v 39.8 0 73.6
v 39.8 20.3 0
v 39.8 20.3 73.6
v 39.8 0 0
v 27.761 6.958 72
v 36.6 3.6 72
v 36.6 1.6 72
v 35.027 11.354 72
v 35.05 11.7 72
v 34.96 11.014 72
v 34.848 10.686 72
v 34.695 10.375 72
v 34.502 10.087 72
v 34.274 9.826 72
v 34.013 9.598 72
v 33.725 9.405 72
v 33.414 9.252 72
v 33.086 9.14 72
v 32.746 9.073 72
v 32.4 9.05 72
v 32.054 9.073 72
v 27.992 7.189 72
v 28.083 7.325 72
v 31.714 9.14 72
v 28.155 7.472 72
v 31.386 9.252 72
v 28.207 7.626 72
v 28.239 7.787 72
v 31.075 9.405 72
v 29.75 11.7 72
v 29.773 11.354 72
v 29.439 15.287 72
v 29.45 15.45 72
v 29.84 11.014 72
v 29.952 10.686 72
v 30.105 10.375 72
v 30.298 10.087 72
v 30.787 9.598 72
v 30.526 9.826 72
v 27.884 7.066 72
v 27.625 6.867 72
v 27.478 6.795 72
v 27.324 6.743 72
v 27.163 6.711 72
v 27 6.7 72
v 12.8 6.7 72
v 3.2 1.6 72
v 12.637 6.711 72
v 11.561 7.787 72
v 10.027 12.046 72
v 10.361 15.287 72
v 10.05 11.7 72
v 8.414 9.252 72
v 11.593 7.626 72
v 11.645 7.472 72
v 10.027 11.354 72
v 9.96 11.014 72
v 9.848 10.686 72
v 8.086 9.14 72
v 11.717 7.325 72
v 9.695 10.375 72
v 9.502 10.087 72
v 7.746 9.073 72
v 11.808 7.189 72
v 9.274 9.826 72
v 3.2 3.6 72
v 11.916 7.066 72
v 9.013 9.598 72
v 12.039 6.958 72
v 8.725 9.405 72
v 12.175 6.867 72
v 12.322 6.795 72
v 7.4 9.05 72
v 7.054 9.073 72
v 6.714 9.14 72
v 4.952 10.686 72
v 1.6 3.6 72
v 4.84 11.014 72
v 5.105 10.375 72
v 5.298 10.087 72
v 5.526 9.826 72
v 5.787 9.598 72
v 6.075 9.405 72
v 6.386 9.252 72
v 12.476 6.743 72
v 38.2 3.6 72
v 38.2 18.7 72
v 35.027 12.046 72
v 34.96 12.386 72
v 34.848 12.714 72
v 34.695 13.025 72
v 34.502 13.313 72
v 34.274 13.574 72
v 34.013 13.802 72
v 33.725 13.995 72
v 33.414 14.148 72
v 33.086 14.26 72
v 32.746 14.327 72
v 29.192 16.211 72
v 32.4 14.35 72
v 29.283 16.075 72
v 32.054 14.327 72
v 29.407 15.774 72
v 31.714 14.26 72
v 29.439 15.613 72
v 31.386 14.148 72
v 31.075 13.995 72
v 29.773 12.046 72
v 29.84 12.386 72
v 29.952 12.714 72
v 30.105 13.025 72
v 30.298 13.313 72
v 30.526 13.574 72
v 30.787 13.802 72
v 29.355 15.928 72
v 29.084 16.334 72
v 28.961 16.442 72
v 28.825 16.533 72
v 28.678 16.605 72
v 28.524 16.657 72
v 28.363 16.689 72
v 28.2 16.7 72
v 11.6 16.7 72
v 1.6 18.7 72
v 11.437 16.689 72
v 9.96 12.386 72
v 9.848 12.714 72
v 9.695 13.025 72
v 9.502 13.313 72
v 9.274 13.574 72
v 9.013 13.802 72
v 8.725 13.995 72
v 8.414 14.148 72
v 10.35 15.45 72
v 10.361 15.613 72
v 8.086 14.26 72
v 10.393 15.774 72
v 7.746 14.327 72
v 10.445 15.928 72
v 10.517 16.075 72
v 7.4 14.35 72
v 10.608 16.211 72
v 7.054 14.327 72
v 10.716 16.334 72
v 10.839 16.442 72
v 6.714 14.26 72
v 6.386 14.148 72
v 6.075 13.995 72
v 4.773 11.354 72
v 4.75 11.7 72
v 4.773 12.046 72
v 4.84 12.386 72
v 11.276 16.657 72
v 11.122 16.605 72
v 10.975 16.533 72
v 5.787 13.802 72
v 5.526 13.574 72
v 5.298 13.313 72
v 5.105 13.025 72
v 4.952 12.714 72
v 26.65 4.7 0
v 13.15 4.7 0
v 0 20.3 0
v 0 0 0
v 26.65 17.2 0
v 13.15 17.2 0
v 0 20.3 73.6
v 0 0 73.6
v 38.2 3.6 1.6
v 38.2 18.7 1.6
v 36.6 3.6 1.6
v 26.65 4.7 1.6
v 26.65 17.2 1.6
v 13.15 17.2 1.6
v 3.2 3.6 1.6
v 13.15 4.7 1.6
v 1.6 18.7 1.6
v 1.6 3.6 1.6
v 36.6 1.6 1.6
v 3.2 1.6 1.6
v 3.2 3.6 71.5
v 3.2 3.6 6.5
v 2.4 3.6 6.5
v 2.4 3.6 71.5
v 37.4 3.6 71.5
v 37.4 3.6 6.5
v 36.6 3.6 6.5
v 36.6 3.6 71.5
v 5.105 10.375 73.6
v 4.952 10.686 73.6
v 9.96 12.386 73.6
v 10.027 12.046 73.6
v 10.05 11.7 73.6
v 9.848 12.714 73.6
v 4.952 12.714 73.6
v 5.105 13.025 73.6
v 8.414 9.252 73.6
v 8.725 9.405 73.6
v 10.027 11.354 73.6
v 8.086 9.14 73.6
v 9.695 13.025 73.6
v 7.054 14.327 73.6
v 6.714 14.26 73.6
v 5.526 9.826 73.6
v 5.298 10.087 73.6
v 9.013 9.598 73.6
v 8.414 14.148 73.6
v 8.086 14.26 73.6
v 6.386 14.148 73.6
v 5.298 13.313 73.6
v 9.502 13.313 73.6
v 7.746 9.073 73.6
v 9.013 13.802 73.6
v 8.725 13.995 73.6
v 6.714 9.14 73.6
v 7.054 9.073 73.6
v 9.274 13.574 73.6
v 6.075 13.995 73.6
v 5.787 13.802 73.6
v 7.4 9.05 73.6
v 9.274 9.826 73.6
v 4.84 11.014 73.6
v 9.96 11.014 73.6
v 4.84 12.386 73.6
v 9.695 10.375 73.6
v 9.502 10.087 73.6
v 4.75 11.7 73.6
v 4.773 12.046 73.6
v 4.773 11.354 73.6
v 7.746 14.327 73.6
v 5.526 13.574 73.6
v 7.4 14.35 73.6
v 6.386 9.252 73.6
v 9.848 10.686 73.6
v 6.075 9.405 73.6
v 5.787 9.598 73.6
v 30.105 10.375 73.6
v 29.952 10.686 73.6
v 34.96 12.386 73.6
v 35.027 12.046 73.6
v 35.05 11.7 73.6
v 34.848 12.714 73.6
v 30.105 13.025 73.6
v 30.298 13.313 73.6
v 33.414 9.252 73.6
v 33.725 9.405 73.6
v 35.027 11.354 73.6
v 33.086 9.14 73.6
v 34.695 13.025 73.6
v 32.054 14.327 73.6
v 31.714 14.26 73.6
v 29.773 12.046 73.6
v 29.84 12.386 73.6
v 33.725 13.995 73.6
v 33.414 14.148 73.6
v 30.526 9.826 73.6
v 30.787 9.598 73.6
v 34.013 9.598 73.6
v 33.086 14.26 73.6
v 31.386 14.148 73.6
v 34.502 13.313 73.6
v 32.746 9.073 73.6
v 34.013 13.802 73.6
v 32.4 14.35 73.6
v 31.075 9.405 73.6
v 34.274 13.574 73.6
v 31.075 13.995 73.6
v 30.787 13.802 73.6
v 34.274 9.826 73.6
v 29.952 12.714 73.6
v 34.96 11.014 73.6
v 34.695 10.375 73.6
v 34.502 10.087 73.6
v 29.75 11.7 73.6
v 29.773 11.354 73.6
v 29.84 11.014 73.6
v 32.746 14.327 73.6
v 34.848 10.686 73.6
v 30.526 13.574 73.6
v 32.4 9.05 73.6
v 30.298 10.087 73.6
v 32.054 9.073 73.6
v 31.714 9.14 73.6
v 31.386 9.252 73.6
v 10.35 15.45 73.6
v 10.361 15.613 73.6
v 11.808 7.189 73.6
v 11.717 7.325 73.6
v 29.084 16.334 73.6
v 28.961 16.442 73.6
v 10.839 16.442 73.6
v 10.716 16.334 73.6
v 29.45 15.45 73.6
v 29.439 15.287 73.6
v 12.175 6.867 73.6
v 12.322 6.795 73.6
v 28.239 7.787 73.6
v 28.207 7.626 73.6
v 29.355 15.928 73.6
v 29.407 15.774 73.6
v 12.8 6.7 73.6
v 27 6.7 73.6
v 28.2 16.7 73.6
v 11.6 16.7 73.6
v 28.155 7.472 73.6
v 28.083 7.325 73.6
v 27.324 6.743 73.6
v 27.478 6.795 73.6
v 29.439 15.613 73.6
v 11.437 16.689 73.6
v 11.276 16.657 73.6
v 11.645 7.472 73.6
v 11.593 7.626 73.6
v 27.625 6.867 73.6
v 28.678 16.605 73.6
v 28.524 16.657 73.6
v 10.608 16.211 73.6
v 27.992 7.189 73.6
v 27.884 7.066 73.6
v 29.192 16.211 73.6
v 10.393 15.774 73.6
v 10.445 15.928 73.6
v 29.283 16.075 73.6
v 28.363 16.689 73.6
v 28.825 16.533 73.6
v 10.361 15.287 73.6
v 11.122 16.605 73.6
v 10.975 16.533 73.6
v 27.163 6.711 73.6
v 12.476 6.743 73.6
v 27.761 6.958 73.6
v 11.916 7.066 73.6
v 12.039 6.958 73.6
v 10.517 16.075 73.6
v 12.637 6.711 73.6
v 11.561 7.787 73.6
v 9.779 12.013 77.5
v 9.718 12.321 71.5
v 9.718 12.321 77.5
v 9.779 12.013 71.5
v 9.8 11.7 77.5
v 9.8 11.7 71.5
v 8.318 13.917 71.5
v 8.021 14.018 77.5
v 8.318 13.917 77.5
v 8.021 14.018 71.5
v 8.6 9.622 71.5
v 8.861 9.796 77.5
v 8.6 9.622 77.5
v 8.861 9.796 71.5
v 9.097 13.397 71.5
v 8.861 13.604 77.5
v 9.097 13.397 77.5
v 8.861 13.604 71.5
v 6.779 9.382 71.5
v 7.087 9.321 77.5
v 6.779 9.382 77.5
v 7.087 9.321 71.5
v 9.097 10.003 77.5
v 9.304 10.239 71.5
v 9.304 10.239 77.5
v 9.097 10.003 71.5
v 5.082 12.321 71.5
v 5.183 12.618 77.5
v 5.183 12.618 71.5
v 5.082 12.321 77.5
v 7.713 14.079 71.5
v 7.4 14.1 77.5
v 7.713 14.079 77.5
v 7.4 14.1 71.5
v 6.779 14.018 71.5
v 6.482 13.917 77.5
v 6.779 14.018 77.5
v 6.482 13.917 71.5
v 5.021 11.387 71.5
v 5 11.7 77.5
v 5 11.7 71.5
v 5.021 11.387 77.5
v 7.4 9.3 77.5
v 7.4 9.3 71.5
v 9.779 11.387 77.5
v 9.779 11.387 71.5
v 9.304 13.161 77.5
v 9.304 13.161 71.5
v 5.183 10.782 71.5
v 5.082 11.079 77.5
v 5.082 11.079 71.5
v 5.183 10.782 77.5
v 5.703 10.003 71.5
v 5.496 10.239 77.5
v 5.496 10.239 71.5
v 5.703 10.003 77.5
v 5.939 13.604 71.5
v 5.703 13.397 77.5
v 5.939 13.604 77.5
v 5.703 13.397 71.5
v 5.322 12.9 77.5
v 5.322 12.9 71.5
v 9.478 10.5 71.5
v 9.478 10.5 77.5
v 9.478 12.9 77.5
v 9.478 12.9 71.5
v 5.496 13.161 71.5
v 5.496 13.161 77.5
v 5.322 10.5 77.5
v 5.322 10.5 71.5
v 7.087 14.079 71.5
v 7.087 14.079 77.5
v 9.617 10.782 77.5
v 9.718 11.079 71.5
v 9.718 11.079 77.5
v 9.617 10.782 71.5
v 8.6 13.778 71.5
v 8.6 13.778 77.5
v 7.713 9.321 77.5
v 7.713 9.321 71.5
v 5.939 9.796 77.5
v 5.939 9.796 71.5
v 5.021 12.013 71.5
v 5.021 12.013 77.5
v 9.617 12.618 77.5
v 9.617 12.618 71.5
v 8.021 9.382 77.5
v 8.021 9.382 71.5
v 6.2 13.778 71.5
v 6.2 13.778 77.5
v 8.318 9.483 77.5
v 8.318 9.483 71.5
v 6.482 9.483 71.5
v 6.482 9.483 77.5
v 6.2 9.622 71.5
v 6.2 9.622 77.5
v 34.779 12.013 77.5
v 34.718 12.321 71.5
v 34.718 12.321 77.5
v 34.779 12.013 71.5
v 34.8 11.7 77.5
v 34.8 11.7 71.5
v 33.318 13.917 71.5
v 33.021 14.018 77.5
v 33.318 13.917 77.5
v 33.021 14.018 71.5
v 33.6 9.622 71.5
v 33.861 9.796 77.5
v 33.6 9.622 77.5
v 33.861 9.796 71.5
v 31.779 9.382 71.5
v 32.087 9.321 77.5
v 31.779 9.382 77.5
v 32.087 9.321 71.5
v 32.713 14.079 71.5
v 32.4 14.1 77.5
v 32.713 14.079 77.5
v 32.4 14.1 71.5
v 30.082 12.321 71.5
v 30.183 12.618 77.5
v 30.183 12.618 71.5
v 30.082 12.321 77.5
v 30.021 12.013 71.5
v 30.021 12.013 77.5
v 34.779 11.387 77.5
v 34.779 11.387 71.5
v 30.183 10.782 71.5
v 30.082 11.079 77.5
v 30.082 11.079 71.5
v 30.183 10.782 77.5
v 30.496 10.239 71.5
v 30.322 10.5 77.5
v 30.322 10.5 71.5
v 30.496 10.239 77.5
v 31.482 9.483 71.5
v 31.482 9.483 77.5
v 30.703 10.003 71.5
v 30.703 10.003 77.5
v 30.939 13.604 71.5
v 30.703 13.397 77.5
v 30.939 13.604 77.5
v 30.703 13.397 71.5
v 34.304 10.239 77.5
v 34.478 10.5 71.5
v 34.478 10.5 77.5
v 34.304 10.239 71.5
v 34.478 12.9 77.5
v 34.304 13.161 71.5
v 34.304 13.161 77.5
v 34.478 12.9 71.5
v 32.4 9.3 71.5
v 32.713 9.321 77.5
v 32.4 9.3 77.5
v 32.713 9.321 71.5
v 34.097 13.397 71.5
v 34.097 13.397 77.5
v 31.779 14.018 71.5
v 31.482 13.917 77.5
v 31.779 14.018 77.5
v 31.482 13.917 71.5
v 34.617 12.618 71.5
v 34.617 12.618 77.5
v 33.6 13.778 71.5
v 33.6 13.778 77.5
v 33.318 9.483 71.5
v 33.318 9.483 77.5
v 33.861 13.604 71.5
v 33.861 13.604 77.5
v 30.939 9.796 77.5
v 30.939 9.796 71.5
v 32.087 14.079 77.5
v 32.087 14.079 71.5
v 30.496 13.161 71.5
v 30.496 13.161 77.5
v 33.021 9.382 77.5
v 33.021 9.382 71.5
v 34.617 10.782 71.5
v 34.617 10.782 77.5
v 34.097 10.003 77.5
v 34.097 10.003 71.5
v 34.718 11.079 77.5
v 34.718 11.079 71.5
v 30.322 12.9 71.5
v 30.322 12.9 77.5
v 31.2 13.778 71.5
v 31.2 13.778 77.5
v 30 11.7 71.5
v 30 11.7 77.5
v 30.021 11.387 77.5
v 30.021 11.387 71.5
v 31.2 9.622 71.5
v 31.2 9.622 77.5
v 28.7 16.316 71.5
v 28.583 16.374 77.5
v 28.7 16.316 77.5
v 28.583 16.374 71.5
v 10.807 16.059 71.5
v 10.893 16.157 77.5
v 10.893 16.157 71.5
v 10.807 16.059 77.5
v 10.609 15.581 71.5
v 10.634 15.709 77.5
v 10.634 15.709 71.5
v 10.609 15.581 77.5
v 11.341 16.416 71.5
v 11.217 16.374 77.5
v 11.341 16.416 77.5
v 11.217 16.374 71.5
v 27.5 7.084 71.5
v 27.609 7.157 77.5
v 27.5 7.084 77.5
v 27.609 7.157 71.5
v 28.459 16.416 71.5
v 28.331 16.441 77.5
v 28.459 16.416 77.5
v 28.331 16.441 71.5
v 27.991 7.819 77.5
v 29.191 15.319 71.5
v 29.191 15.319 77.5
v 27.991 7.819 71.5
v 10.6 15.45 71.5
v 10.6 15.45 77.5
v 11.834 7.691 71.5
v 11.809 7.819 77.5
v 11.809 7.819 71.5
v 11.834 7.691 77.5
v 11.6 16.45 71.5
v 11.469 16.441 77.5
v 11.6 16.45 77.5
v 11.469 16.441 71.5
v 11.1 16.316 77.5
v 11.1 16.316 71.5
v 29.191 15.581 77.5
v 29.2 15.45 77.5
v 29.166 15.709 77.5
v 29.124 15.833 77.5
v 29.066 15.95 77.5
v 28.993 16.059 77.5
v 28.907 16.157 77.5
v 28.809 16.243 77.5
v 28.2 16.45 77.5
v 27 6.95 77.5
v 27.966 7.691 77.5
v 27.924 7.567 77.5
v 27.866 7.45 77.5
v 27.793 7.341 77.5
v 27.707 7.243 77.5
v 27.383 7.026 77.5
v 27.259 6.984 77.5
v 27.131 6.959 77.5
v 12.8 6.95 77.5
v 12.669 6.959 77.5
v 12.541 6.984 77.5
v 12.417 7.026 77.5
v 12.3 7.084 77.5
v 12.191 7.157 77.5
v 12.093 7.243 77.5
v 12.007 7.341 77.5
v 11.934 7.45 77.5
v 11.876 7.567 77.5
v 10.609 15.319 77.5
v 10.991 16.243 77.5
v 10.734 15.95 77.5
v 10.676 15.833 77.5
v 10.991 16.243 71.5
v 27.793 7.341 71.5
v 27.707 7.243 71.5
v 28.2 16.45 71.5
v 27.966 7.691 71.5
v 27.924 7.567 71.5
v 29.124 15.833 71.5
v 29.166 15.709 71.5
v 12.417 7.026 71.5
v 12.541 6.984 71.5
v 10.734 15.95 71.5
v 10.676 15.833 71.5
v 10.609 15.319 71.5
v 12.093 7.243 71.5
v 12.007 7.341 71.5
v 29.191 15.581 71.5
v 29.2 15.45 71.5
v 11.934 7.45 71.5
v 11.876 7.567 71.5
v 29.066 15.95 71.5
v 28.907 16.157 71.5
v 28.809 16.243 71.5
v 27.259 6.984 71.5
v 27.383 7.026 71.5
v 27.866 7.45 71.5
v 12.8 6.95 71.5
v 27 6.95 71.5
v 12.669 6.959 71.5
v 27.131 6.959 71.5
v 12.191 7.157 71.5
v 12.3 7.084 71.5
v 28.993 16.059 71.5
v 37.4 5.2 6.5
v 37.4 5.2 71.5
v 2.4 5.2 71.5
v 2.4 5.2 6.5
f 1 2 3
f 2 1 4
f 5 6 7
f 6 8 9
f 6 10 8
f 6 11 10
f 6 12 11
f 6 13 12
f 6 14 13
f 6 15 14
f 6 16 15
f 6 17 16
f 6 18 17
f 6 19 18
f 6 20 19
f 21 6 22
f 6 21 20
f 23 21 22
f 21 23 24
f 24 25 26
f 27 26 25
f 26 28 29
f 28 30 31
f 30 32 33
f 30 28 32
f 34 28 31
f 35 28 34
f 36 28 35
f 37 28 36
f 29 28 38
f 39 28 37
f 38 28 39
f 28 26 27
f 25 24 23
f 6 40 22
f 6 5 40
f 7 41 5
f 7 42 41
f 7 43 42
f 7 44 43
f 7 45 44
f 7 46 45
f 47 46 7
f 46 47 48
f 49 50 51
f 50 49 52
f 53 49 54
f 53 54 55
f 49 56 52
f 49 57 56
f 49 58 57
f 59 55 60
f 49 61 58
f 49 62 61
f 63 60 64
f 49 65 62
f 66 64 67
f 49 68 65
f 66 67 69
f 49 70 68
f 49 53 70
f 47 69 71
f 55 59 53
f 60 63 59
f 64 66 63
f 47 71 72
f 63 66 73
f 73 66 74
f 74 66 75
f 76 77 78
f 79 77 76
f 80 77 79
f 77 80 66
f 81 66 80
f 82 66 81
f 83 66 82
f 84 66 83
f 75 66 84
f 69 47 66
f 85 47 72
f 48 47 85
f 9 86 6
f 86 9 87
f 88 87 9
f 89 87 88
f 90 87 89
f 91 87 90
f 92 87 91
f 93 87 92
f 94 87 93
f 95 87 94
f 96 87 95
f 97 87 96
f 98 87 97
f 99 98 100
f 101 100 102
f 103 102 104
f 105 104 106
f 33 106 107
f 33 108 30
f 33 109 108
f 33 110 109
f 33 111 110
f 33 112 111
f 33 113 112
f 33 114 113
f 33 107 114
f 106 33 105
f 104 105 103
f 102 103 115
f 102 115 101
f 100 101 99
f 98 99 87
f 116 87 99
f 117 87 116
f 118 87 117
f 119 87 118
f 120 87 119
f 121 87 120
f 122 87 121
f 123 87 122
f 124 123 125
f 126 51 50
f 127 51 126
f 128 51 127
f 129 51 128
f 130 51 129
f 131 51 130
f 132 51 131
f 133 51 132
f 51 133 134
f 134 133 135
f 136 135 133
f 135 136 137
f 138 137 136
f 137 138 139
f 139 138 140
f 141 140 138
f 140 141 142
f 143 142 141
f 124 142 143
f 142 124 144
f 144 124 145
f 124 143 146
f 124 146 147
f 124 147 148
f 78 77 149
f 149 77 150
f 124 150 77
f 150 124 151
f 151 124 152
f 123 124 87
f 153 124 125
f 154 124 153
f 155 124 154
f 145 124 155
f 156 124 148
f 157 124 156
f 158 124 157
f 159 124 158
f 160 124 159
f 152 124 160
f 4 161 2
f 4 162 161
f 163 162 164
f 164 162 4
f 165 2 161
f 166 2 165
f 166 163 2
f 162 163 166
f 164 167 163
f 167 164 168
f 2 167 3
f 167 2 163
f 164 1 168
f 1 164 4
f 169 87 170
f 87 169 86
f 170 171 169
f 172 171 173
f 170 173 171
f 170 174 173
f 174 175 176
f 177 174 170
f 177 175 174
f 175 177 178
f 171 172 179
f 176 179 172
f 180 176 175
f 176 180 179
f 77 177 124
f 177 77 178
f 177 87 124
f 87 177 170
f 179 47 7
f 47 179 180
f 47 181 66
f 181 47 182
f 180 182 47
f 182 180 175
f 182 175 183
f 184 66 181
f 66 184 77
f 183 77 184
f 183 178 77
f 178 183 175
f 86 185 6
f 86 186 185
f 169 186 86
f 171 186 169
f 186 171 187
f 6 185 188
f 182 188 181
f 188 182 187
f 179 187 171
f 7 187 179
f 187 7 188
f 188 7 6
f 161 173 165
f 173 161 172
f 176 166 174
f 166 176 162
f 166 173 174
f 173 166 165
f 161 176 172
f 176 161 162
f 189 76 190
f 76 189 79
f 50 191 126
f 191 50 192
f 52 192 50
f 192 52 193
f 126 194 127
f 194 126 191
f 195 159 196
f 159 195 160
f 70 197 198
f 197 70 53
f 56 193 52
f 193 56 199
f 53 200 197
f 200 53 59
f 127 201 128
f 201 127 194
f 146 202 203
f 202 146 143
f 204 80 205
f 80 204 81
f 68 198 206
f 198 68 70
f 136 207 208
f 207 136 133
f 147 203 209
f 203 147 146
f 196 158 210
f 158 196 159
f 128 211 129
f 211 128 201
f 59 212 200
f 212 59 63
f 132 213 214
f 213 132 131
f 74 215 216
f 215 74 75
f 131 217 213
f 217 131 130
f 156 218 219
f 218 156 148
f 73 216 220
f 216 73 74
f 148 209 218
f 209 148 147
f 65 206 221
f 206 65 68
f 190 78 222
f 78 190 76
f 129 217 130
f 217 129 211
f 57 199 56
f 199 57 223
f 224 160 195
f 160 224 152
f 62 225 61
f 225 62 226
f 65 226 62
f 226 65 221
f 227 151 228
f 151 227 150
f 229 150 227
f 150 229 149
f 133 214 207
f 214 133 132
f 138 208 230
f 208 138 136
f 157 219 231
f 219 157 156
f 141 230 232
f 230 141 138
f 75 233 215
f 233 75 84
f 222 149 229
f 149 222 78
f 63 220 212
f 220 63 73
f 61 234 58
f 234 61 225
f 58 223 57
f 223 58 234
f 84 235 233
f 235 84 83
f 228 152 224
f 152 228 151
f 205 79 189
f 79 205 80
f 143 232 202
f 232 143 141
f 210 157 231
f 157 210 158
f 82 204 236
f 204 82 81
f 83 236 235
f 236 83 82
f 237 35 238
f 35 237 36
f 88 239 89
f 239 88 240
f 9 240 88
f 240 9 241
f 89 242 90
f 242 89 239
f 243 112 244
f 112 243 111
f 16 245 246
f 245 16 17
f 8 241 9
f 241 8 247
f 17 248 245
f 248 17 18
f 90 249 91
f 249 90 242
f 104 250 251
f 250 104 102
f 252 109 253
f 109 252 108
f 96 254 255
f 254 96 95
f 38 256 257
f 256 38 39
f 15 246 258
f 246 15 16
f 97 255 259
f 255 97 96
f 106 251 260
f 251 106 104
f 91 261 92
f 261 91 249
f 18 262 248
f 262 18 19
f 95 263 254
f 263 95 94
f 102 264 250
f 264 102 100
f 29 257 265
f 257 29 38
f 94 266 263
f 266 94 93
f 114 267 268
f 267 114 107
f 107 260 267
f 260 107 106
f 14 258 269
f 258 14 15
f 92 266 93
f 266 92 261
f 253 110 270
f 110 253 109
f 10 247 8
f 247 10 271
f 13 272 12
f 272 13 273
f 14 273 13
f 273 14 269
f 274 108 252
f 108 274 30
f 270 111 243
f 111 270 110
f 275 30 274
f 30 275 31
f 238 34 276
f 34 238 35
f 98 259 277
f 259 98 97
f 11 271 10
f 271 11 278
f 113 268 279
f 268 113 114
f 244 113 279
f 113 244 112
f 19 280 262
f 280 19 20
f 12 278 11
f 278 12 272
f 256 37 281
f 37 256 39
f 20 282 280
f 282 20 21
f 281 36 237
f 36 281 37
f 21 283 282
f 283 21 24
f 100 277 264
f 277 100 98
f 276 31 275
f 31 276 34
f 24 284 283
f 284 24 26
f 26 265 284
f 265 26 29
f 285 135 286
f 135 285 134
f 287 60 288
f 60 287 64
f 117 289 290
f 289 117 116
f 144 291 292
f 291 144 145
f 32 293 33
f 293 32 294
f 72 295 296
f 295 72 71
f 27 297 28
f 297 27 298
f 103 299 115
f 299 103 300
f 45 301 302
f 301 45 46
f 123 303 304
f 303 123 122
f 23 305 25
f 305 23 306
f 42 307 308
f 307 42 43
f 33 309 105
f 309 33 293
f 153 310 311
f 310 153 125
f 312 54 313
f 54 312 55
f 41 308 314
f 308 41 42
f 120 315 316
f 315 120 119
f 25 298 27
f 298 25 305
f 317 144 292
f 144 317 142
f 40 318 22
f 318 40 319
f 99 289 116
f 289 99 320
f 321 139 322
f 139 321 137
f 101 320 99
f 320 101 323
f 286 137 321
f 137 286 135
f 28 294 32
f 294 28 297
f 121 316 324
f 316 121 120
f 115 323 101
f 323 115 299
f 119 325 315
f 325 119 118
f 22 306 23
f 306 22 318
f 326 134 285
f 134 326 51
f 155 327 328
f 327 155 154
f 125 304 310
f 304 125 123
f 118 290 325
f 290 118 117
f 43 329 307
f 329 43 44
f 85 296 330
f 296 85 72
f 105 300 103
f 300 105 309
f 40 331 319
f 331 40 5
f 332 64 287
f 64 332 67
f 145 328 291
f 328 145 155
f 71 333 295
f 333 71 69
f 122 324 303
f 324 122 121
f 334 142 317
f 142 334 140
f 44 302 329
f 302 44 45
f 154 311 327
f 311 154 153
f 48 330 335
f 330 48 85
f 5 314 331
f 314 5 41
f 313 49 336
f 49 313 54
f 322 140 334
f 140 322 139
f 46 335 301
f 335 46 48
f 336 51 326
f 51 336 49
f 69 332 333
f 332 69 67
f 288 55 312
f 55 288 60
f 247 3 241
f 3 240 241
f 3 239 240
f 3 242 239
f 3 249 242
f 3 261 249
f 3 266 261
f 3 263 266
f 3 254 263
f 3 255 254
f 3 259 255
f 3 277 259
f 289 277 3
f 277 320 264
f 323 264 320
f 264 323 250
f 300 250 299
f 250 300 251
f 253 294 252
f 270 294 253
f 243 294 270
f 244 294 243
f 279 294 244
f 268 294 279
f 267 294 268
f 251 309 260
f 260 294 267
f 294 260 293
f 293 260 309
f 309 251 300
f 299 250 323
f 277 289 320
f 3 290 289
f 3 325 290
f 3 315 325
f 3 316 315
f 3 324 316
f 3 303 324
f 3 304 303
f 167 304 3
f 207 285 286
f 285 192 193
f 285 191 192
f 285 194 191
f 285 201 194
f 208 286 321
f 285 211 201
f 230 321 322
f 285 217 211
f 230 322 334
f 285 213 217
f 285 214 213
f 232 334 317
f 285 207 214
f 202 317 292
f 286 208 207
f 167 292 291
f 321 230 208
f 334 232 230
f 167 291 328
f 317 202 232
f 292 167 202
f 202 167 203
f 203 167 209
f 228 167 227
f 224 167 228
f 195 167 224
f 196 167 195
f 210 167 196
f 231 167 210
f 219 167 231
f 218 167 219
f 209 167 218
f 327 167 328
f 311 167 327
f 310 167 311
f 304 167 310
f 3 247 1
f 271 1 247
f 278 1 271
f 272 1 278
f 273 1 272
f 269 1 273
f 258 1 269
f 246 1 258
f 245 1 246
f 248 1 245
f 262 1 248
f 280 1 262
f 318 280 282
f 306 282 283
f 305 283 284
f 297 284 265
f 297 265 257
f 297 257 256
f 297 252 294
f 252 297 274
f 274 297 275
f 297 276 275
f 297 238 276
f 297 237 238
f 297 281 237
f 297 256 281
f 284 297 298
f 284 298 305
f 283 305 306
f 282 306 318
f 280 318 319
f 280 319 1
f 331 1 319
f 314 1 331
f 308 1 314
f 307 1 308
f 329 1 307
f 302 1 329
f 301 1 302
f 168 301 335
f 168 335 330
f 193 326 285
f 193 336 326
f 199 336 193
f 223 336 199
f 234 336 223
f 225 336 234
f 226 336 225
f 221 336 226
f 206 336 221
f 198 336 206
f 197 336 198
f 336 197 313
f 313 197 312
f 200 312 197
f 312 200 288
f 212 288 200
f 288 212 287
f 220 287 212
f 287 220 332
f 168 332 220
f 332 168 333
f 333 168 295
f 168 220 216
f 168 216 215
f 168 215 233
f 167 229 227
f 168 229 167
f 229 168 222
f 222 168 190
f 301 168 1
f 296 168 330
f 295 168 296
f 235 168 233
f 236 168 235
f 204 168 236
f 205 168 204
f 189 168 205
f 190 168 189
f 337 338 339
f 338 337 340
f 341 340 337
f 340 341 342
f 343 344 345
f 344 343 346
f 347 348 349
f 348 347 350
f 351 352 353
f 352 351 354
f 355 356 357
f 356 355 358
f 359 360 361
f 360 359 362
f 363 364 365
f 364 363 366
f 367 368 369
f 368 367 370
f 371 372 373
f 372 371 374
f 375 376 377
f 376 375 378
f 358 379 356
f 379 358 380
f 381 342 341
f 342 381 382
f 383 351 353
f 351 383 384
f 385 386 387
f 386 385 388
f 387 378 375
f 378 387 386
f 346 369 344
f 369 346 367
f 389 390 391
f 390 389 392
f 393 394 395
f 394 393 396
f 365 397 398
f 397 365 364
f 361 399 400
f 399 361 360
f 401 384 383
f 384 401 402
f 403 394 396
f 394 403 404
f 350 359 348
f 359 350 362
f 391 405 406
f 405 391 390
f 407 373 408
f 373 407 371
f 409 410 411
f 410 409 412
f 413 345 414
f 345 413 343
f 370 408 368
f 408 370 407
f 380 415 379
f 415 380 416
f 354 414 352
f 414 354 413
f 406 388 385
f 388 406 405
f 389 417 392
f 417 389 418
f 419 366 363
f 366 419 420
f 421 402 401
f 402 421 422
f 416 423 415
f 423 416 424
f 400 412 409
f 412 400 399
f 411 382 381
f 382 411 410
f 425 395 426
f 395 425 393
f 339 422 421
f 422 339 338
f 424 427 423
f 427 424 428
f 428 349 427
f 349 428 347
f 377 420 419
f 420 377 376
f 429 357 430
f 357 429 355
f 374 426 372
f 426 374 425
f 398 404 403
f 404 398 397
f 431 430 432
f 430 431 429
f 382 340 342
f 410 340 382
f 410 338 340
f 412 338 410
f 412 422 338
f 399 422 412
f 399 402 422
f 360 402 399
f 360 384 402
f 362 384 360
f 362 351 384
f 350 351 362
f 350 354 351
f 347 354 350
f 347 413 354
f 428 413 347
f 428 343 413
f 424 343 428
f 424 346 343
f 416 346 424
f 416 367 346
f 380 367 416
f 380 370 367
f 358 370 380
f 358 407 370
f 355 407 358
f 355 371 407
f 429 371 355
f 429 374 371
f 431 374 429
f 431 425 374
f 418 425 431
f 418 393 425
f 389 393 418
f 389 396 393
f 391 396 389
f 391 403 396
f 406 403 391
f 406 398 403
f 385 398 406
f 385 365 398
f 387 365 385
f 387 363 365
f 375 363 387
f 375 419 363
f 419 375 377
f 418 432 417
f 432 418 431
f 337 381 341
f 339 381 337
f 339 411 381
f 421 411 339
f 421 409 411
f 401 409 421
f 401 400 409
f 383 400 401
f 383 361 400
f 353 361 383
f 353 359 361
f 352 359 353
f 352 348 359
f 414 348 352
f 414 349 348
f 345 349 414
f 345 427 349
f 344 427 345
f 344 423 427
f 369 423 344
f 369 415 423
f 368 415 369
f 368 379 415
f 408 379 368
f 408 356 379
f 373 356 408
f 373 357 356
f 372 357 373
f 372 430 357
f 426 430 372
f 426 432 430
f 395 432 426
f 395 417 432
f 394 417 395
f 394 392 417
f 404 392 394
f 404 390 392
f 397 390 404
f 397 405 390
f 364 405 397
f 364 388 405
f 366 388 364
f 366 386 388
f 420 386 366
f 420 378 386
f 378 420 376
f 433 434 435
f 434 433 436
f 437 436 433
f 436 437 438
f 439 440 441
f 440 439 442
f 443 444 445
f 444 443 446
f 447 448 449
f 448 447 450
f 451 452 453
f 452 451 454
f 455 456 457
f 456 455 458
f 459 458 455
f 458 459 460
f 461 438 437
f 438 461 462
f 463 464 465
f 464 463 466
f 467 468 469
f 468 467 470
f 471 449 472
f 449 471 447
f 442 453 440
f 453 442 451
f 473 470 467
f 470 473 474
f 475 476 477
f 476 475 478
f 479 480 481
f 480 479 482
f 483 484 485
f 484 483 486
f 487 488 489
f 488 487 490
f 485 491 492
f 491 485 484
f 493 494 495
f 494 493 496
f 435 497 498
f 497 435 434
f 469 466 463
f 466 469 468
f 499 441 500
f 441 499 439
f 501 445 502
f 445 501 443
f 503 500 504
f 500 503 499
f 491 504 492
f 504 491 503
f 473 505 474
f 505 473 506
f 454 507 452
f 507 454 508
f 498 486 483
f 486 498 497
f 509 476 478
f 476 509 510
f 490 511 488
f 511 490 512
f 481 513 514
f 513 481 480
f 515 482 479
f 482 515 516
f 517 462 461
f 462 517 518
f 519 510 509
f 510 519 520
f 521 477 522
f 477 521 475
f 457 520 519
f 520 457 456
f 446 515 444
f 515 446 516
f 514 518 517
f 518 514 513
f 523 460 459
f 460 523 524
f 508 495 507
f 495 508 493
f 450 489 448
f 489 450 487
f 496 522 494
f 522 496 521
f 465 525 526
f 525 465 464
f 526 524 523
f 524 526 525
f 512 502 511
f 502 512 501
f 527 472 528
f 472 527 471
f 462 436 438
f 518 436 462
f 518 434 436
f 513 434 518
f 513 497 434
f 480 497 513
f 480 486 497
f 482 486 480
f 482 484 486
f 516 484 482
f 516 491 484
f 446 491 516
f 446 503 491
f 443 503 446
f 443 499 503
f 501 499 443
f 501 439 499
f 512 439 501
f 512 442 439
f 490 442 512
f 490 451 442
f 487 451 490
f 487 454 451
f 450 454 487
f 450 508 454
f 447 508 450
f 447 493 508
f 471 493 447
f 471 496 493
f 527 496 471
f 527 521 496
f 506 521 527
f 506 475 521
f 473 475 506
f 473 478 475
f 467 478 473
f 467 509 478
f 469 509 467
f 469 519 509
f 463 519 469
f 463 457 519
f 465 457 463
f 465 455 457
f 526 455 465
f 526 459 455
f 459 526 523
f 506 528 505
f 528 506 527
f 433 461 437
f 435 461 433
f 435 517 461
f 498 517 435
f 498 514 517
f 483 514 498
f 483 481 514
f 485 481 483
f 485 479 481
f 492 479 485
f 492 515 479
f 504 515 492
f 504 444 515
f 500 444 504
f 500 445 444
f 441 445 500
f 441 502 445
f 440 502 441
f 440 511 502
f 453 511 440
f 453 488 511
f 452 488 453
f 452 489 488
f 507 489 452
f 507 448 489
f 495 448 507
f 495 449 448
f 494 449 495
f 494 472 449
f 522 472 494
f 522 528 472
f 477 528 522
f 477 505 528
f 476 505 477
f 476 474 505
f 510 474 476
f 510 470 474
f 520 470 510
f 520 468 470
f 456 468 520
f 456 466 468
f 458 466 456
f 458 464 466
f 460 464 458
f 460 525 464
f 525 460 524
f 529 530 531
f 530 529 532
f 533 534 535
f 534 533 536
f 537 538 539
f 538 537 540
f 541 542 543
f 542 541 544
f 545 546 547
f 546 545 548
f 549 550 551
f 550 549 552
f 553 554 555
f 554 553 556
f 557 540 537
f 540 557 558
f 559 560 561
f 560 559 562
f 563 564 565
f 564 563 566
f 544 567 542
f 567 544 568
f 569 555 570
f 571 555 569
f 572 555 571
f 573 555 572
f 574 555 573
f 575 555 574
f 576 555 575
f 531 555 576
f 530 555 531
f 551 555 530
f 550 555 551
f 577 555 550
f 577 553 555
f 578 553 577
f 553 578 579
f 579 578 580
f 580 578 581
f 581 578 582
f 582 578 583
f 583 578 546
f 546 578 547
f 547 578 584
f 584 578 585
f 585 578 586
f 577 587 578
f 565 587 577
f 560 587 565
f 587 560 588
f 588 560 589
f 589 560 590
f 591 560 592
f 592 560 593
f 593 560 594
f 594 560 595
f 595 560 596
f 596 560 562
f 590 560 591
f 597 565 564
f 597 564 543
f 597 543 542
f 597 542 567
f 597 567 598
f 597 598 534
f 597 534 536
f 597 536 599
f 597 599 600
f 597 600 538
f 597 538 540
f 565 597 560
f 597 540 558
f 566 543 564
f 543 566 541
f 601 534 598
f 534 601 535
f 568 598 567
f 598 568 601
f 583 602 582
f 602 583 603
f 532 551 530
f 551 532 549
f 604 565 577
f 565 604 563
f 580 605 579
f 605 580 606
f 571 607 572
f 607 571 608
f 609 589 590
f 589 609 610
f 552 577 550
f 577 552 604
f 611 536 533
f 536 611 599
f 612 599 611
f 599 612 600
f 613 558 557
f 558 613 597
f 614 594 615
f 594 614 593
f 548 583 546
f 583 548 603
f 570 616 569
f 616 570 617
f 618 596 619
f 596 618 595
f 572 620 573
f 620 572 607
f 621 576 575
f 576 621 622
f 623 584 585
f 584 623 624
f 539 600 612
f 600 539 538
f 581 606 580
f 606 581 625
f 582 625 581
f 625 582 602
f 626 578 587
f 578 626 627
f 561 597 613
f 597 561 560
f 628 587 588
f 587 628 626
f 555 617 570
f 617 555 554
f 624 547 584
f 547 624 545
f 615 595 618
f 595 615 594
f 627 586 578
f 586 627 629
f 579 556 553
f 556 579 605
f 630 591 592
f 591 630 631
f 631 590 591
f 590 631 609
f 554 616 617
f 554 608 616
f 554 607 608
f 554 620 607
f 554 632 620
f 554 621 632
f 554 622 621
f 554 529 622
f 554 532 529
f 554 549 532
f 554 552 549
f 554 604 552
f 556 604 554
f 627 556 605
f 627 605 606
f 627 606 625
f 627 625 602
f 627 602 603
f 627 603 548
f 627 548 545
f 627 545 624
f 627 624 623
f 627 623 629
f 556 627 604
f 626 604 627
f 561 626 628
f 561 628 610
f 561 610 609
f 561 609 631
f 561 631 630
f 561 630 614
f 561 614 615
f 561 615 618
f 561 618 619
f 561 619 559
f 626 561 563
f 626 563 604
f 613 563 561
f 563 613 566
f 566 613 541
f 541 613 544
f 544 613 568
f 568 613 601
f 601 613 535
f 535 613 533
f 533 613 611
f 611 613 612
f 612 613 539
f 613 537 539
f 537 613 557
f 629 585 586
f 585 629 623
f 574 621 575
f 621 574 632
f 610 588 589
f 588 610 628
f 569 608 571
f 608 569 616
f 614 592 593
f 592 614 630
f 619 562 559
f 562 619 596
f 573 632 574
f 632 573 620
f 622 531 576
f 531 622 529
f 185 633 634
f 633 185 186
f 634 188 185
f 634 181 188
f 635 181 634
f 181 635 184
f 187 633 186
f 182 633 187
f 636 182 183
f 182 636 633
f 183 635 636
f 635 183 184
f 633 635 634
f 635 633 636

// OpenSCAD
// file: lid-lib.scad
module rounded_db9_face(
    wide_width,
    narrow_width,
    height,
    radius,
    fn = 48
) {
    hull() {
        for (point = [
            [-narrow_width / 2 + radius, -height / 2 + radius],
            [ narrow_width / 2 - radius, -height / 2 + radius],
            [-wide_width / 2 + radius, height / 2 - radius],
            [ wide_width / 2 - radius, height / 2 - radius]
        ])
            translate(point)
                circle(r = radius, $fn = fn);
    }
}

module db9_pattern(
    center,
    face_wide_width,
    face_narrow_width,
    face_height,
    face_radius,
    screw_spacing,
    screw_diameter,
    clearance,
    extrusion_height,
    fn = 48
) {
    translate([center[0], center[1], 0]) {
        linear_extrude(height = extrusion_height)
            rounded_db9_face(
                face_wide_width + 2 * clearance,
                face_narrow_width + 2 * clearance,
                face_height + 2 * clearance,
                face_radius + clearance,
                fn
            );

        for (x = [-screw_spacing / 2, screw_spacing / 2])
            translate([x, 0, 0])
                cylinder(
                    h = extrusion_height,
                    d = screw_diameter + 2 * clearance,
                    $fn = fn
                );
    }
}

module lid(
    size,
    thickness,
    db9_center,
    face_wide_width,
    face_narrow_width,
    face_height,
    face_radius,
    screw_spacing,
    screw_diameter,
    clearance,
    epsilon = 0.01
) {
    difference() {
        cube([size[0], size[1], thickness]);
        translate([0, 0, -epsilon])
            db9_pattern(
                db9_center,
                face_wide_width,
                face_narrow_width,
                face_height,
                face_radius,
                screw_spacing,
                screw_diameter,
                clearance,
                thickness + 2 * epsilon
            );
    }
}
// file: model.scad
// Vertical, open-ended case for the DIYMORE FT232BM/BL USB serial adapter.
// The USB end is the print bed; the DB9 end is the open top.
// All dimensions are in millimetres.

include <dimensions.scad>

module guide_ribs() {
    for (x = [wall, pcb_x + pcb_width - guide_contact_width])
        translate([x, wall, bottom_thickness])
            cube([
                width_clearance + guide_contact_width,
                underboard_clearance,
                case_height - bottom_thickness
            ]);
}

module case() {
    difference() {
        union() {
            difference() {
                cube([outer_width, outer_depth, case_height]);

                // The cavity continues through the DB9 end, making that end
                // the completely open mouth of the well.
                translate([wall, wall, bottom_thickness])
                    cube([inner_width, inner_depth, case_height]);
            }
            guide_ribs();
        }

        // USB-B opening through the closed bottom face.
        translate([
            pcb_x + (pcb_width - usb_opening_width) / 2,
            pcb_top_y - usb_opening_below_pcb_top,
            -epsilon
        ])
            cube([
                usb_opening_width,
                usb_opening_depth,
                bottom_thickness + 2 * epsilon
            ]);
    }
}

case();
// file: dimensions.scad
// Shared dimensions for the case, lid, and assembly preview.

// PCB dimensions.
pcb_length = 65; // USB edge to DB9 edge; confirmed
pcb_width = 35;  // confirmed
pcb_thickness = 1.6;
width_clearance = 0.8;

// Cross-section viewed from the USB end.
underboard_clearance = 2;
component_height = 13; // estimated PCB top to tallest component
component_clearance = 0.5;

// Case dimensions. A 1.6 mm wall is four lines with a 0.4 mm nozzle.
wall = 1.6;
bottom_thickness = 1.6;
top_clearance = 0.5;

// Distance the USB-B shell extends beyond the PCB edge.
usb_projection = 6.5;

// USB-B opening in the closed bottom, viewed from the connector end.
usb_opening_width = 13.5;
usb_opening_depth = 12.5;
usb_opening_below_pcb_top = 0.5;

// Side ribs overlap only this much of each PCB edge.
guide_contact_width = 0.8;

// Flat DB9-end lid. Measurements are derived from the straight-on product
// photo and the connector's 25 mm screw spacing; verify after a fit test.
lid_thickness = 1.6;
db9_face_wide_width = 18.6;
db9_face_narrow_width = 16.2;
db9_face_height = 9.5;
db9_face_corner_radius = 1;
db9_screw_spacing = 25;
db9_screw_boss_diameter = 4.8;
db9_fit_clearance = 0.25;
db9_center_above_pcb_top = 6.5;

epsilon = 0.01;

inner_width = pcb_width + 2 * width_clearance;
inner_depth = underboard_clearance
    + pcb_thickness
    + component_height
    + component_clearance;
outer_width = inner_width + 2 * wall;
outer_depth = inner_depth + 2 * wall;
case_height = usb_projection + pcb_length + top_clearance;

pcb_x = wall + width_clearance;
pcb_y = wall + underboard_clearance;
pcb_top_y = pcb_y + pcb_thickness;

db9_center_x = outer_width / 2;
db9_center_y = pcb_top_y + db9_center_above_pcb_top;
// main file
// Case and DB9 lid in their assembled positions, with a translucent PCB and
// connector envelope for context. Reference geometry is not exported.

include <dimensions.scad>
use <model.scad>
use <lid-lib.scad>

case();

translate([0, 0, case_height])
    lid(
        [outer_width, outer_depth],
        lid_thickness,
        [db9_center_x, db9_center_y],
        db9_face_wide_width,
        db9_face_narrow_width,
        db9_face_height,
        db9_face_corner_radius,
        db9_screw_spacing,
        db9_screw_boss_diameter,
        db9_fit_clearance,
        epsilon
    );

color([0.08, 0.25, 0.08])
    translate([pcb_x, pcb_y, usb_projection])
        cube([pcb_width, pcb_thickness, pcb_length]);

color([0.65, 0.65, 0.68])
    translate([0, 0, usb_projection + pcb_length])
        db9_pattern(
            [db9_center_x, db9_center_y],
            db9_face_wide_width,
            db9_face_narrow_width,
            db9_face_height,
            db9_face_corner_radius,
            db9_screw_spacing,
            db9_screw_boss_diameter,
            0,
            6
        );
